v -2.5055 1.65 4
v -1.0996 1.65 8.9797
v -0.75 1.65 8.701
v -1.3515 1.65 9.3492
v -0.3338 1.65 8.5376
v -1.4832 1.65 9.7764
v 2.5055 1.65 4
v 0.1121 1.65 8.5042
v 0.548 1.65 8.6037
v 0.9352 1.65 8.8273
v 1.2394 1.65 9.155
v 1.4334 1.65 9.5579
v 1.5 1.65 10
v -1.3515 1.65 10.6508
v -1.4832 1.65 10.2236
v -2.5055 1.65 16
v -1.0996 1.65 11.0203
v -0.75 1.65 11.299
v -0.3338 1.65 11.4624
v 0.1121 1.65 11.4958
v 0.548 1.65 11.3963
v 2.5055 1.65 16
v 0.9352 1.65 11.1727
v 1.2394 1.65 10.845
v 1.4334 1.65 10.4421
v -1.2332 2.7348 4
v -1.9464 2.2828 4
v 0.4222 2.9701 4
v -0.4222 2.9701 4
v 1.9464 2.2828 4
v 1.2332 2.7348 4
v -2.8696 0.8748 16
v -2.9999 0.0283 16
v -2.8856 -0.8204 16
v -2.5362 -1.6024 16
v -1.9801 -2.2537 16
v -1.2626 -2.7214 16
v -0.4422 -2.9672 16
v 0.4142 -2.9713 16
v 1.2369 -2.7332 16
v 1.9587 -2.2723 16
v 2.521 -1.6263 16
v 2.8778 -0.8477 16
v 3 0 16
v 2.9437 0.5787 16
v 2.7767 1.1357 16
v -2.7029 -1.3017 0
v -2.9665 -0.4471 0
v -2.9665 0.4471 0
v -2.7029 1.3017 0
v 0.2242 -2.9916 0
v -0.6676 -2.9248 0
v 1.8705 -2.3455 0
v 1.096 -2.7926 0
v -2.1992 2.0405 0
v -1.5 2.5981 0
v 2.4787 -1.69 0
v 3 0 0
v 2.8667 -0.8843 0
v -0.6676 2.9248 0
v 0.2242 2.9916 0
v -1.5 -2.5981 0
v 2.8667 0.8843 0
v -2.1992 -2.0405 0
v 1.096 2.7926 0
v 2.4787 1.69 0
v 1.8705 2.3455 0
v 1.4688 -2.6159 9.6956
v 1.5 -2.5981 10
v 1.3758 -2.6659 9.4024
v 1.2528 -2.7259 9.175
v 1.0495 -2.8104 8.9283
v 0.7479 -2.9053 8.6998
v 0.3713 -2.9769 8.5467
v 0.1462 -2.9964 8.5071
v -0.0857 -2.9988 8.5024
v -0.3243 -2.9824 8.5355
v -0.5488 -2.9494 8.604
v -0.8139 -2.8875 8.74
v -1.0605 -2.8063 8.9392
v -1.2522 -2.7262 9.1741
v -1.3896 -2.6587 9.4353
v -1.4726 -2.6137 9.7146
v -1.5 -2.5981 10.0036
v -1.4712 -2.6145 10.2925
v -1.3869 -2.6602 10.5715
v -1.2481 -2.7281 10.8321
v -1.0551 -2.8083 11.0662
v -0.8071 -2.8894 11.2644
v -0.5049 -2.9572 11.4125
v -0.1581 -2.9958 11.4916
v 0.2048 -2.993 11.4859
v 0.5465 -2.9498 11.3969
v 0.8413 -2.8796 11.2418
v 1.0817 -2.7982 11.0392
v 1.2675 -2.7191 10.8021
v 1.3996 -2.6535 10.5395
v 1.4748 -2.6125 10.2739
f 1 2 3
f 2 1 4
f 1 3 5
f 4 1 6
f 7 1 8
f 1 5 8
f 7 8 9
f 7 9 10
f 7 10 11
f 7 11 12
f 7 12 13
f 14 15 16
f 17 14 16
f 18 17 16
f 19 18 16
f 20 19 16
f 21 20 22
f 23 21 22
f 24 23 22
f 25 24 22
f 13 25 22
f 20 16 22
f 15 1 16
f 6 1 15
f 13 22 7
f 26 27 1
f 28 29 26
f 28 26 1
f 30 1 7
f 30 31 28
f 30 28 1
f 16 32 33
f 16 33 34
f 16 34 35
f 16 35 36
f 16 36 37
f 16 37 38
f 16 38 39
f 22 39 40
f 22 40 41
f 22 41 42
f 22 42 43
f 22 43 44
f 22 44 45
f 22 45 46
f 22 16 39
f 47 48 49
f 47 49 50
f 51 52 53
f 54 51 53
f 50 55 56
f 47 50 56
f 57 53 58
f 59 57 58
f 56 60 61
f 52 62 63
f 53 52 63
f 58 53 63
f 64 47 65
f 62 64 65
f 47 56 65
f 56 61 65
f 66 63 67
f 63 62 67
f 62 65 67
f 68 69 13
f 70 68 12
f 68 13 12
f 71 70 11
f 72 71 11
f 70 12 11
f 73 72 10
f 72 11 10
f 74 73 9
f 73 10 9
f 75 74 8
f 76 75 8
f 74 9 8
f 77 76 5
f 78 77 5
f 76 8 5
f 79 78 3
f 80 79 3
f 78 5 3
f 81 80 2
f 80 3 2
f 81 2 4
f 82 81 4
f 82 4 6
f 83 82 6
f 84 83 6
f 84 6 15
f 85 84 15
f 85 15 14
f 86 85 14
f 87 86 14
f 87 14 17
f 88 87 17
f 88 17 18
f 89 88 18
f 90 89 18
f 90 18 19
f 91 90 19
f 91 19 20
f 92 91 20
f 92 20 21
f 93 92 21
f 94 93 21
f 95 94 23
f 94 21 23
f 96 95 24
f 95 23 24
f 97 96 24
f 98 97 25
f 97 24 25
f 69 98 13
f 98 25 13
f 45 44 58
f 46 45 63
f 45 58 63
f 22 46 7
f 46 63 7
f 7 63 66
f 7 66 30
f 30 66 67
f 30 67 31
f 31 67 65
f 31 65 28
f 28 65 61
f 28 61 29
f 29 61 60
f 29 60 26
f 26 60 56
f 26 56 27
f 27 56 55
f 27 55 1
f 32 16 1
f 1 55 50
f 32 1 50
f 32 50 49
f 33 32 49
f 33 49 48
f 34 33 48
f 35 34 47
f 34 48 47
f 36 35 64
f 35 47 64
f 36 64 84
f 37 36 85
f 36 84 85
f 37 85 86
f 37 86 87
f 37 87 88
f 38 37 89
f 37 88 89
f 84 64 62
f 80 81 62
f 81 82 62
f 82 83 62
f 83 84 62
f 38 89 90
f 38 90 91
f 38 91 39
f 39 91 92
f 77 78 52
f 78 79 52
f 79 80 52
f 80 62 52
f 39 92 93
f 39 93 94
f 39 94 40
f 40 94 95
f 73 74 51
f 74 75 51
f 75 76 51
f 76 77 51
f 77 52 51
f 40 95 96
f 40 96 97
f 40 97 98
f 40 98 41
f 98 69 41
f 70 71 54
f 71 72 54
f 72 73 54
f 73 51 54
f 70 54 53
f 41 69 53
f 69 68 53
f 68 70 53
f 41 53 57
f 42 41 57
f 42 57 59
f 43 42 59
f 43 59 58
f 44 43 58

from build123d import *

# Parameters (mm, degrees)
SKETCH1_R           = 3
BOSS_EXTRUDE1_DEPTH = 16
CUT_EXTRUDE1_DEPTH  = 12
SKETCH3_R           = 1.5
CUT_EXTRUDE2_DEPTH  = 12


with BuildPart() as part:
    # Sketch1 → Boss-Extrude1 (new body)
    with BuildSketch(Plane.XY):
        Circle(SKETCH1_R)
    extrude(amount=BOSS_EXTRUDE1_DEPTH)

    # Sketch2 → Cut-Extrude1 (cut)
    with BuildSketch(Plane.XY.offset(16)):
        with BuildLine():
            Line((-2.505493963, 1.65), (2.505493963, 1.65))
            ThreePointArc((2.505493963, 1.65), (0, 3), (-2.505493963, 1.65))
        make_face()
    extrude(amount=-CUT_EXTRUDE1_DEPTH, mode=Mode.SUBTRACT)

    # Sketch3 → Cut-Extrude2 (cut)
    with BuildSketch(Plane(origin=(0, 1.65, 0), x_dir=(1, 0, 0), z_dir=(0, 1, 0))):
        with Locations((0, -10)):
            Circle(SKETCH3_R)
    extrude(amount=-CUT_EXTRUDE2_DEPTH, mode=Mode.SUBTRACT)


solid = part.part
